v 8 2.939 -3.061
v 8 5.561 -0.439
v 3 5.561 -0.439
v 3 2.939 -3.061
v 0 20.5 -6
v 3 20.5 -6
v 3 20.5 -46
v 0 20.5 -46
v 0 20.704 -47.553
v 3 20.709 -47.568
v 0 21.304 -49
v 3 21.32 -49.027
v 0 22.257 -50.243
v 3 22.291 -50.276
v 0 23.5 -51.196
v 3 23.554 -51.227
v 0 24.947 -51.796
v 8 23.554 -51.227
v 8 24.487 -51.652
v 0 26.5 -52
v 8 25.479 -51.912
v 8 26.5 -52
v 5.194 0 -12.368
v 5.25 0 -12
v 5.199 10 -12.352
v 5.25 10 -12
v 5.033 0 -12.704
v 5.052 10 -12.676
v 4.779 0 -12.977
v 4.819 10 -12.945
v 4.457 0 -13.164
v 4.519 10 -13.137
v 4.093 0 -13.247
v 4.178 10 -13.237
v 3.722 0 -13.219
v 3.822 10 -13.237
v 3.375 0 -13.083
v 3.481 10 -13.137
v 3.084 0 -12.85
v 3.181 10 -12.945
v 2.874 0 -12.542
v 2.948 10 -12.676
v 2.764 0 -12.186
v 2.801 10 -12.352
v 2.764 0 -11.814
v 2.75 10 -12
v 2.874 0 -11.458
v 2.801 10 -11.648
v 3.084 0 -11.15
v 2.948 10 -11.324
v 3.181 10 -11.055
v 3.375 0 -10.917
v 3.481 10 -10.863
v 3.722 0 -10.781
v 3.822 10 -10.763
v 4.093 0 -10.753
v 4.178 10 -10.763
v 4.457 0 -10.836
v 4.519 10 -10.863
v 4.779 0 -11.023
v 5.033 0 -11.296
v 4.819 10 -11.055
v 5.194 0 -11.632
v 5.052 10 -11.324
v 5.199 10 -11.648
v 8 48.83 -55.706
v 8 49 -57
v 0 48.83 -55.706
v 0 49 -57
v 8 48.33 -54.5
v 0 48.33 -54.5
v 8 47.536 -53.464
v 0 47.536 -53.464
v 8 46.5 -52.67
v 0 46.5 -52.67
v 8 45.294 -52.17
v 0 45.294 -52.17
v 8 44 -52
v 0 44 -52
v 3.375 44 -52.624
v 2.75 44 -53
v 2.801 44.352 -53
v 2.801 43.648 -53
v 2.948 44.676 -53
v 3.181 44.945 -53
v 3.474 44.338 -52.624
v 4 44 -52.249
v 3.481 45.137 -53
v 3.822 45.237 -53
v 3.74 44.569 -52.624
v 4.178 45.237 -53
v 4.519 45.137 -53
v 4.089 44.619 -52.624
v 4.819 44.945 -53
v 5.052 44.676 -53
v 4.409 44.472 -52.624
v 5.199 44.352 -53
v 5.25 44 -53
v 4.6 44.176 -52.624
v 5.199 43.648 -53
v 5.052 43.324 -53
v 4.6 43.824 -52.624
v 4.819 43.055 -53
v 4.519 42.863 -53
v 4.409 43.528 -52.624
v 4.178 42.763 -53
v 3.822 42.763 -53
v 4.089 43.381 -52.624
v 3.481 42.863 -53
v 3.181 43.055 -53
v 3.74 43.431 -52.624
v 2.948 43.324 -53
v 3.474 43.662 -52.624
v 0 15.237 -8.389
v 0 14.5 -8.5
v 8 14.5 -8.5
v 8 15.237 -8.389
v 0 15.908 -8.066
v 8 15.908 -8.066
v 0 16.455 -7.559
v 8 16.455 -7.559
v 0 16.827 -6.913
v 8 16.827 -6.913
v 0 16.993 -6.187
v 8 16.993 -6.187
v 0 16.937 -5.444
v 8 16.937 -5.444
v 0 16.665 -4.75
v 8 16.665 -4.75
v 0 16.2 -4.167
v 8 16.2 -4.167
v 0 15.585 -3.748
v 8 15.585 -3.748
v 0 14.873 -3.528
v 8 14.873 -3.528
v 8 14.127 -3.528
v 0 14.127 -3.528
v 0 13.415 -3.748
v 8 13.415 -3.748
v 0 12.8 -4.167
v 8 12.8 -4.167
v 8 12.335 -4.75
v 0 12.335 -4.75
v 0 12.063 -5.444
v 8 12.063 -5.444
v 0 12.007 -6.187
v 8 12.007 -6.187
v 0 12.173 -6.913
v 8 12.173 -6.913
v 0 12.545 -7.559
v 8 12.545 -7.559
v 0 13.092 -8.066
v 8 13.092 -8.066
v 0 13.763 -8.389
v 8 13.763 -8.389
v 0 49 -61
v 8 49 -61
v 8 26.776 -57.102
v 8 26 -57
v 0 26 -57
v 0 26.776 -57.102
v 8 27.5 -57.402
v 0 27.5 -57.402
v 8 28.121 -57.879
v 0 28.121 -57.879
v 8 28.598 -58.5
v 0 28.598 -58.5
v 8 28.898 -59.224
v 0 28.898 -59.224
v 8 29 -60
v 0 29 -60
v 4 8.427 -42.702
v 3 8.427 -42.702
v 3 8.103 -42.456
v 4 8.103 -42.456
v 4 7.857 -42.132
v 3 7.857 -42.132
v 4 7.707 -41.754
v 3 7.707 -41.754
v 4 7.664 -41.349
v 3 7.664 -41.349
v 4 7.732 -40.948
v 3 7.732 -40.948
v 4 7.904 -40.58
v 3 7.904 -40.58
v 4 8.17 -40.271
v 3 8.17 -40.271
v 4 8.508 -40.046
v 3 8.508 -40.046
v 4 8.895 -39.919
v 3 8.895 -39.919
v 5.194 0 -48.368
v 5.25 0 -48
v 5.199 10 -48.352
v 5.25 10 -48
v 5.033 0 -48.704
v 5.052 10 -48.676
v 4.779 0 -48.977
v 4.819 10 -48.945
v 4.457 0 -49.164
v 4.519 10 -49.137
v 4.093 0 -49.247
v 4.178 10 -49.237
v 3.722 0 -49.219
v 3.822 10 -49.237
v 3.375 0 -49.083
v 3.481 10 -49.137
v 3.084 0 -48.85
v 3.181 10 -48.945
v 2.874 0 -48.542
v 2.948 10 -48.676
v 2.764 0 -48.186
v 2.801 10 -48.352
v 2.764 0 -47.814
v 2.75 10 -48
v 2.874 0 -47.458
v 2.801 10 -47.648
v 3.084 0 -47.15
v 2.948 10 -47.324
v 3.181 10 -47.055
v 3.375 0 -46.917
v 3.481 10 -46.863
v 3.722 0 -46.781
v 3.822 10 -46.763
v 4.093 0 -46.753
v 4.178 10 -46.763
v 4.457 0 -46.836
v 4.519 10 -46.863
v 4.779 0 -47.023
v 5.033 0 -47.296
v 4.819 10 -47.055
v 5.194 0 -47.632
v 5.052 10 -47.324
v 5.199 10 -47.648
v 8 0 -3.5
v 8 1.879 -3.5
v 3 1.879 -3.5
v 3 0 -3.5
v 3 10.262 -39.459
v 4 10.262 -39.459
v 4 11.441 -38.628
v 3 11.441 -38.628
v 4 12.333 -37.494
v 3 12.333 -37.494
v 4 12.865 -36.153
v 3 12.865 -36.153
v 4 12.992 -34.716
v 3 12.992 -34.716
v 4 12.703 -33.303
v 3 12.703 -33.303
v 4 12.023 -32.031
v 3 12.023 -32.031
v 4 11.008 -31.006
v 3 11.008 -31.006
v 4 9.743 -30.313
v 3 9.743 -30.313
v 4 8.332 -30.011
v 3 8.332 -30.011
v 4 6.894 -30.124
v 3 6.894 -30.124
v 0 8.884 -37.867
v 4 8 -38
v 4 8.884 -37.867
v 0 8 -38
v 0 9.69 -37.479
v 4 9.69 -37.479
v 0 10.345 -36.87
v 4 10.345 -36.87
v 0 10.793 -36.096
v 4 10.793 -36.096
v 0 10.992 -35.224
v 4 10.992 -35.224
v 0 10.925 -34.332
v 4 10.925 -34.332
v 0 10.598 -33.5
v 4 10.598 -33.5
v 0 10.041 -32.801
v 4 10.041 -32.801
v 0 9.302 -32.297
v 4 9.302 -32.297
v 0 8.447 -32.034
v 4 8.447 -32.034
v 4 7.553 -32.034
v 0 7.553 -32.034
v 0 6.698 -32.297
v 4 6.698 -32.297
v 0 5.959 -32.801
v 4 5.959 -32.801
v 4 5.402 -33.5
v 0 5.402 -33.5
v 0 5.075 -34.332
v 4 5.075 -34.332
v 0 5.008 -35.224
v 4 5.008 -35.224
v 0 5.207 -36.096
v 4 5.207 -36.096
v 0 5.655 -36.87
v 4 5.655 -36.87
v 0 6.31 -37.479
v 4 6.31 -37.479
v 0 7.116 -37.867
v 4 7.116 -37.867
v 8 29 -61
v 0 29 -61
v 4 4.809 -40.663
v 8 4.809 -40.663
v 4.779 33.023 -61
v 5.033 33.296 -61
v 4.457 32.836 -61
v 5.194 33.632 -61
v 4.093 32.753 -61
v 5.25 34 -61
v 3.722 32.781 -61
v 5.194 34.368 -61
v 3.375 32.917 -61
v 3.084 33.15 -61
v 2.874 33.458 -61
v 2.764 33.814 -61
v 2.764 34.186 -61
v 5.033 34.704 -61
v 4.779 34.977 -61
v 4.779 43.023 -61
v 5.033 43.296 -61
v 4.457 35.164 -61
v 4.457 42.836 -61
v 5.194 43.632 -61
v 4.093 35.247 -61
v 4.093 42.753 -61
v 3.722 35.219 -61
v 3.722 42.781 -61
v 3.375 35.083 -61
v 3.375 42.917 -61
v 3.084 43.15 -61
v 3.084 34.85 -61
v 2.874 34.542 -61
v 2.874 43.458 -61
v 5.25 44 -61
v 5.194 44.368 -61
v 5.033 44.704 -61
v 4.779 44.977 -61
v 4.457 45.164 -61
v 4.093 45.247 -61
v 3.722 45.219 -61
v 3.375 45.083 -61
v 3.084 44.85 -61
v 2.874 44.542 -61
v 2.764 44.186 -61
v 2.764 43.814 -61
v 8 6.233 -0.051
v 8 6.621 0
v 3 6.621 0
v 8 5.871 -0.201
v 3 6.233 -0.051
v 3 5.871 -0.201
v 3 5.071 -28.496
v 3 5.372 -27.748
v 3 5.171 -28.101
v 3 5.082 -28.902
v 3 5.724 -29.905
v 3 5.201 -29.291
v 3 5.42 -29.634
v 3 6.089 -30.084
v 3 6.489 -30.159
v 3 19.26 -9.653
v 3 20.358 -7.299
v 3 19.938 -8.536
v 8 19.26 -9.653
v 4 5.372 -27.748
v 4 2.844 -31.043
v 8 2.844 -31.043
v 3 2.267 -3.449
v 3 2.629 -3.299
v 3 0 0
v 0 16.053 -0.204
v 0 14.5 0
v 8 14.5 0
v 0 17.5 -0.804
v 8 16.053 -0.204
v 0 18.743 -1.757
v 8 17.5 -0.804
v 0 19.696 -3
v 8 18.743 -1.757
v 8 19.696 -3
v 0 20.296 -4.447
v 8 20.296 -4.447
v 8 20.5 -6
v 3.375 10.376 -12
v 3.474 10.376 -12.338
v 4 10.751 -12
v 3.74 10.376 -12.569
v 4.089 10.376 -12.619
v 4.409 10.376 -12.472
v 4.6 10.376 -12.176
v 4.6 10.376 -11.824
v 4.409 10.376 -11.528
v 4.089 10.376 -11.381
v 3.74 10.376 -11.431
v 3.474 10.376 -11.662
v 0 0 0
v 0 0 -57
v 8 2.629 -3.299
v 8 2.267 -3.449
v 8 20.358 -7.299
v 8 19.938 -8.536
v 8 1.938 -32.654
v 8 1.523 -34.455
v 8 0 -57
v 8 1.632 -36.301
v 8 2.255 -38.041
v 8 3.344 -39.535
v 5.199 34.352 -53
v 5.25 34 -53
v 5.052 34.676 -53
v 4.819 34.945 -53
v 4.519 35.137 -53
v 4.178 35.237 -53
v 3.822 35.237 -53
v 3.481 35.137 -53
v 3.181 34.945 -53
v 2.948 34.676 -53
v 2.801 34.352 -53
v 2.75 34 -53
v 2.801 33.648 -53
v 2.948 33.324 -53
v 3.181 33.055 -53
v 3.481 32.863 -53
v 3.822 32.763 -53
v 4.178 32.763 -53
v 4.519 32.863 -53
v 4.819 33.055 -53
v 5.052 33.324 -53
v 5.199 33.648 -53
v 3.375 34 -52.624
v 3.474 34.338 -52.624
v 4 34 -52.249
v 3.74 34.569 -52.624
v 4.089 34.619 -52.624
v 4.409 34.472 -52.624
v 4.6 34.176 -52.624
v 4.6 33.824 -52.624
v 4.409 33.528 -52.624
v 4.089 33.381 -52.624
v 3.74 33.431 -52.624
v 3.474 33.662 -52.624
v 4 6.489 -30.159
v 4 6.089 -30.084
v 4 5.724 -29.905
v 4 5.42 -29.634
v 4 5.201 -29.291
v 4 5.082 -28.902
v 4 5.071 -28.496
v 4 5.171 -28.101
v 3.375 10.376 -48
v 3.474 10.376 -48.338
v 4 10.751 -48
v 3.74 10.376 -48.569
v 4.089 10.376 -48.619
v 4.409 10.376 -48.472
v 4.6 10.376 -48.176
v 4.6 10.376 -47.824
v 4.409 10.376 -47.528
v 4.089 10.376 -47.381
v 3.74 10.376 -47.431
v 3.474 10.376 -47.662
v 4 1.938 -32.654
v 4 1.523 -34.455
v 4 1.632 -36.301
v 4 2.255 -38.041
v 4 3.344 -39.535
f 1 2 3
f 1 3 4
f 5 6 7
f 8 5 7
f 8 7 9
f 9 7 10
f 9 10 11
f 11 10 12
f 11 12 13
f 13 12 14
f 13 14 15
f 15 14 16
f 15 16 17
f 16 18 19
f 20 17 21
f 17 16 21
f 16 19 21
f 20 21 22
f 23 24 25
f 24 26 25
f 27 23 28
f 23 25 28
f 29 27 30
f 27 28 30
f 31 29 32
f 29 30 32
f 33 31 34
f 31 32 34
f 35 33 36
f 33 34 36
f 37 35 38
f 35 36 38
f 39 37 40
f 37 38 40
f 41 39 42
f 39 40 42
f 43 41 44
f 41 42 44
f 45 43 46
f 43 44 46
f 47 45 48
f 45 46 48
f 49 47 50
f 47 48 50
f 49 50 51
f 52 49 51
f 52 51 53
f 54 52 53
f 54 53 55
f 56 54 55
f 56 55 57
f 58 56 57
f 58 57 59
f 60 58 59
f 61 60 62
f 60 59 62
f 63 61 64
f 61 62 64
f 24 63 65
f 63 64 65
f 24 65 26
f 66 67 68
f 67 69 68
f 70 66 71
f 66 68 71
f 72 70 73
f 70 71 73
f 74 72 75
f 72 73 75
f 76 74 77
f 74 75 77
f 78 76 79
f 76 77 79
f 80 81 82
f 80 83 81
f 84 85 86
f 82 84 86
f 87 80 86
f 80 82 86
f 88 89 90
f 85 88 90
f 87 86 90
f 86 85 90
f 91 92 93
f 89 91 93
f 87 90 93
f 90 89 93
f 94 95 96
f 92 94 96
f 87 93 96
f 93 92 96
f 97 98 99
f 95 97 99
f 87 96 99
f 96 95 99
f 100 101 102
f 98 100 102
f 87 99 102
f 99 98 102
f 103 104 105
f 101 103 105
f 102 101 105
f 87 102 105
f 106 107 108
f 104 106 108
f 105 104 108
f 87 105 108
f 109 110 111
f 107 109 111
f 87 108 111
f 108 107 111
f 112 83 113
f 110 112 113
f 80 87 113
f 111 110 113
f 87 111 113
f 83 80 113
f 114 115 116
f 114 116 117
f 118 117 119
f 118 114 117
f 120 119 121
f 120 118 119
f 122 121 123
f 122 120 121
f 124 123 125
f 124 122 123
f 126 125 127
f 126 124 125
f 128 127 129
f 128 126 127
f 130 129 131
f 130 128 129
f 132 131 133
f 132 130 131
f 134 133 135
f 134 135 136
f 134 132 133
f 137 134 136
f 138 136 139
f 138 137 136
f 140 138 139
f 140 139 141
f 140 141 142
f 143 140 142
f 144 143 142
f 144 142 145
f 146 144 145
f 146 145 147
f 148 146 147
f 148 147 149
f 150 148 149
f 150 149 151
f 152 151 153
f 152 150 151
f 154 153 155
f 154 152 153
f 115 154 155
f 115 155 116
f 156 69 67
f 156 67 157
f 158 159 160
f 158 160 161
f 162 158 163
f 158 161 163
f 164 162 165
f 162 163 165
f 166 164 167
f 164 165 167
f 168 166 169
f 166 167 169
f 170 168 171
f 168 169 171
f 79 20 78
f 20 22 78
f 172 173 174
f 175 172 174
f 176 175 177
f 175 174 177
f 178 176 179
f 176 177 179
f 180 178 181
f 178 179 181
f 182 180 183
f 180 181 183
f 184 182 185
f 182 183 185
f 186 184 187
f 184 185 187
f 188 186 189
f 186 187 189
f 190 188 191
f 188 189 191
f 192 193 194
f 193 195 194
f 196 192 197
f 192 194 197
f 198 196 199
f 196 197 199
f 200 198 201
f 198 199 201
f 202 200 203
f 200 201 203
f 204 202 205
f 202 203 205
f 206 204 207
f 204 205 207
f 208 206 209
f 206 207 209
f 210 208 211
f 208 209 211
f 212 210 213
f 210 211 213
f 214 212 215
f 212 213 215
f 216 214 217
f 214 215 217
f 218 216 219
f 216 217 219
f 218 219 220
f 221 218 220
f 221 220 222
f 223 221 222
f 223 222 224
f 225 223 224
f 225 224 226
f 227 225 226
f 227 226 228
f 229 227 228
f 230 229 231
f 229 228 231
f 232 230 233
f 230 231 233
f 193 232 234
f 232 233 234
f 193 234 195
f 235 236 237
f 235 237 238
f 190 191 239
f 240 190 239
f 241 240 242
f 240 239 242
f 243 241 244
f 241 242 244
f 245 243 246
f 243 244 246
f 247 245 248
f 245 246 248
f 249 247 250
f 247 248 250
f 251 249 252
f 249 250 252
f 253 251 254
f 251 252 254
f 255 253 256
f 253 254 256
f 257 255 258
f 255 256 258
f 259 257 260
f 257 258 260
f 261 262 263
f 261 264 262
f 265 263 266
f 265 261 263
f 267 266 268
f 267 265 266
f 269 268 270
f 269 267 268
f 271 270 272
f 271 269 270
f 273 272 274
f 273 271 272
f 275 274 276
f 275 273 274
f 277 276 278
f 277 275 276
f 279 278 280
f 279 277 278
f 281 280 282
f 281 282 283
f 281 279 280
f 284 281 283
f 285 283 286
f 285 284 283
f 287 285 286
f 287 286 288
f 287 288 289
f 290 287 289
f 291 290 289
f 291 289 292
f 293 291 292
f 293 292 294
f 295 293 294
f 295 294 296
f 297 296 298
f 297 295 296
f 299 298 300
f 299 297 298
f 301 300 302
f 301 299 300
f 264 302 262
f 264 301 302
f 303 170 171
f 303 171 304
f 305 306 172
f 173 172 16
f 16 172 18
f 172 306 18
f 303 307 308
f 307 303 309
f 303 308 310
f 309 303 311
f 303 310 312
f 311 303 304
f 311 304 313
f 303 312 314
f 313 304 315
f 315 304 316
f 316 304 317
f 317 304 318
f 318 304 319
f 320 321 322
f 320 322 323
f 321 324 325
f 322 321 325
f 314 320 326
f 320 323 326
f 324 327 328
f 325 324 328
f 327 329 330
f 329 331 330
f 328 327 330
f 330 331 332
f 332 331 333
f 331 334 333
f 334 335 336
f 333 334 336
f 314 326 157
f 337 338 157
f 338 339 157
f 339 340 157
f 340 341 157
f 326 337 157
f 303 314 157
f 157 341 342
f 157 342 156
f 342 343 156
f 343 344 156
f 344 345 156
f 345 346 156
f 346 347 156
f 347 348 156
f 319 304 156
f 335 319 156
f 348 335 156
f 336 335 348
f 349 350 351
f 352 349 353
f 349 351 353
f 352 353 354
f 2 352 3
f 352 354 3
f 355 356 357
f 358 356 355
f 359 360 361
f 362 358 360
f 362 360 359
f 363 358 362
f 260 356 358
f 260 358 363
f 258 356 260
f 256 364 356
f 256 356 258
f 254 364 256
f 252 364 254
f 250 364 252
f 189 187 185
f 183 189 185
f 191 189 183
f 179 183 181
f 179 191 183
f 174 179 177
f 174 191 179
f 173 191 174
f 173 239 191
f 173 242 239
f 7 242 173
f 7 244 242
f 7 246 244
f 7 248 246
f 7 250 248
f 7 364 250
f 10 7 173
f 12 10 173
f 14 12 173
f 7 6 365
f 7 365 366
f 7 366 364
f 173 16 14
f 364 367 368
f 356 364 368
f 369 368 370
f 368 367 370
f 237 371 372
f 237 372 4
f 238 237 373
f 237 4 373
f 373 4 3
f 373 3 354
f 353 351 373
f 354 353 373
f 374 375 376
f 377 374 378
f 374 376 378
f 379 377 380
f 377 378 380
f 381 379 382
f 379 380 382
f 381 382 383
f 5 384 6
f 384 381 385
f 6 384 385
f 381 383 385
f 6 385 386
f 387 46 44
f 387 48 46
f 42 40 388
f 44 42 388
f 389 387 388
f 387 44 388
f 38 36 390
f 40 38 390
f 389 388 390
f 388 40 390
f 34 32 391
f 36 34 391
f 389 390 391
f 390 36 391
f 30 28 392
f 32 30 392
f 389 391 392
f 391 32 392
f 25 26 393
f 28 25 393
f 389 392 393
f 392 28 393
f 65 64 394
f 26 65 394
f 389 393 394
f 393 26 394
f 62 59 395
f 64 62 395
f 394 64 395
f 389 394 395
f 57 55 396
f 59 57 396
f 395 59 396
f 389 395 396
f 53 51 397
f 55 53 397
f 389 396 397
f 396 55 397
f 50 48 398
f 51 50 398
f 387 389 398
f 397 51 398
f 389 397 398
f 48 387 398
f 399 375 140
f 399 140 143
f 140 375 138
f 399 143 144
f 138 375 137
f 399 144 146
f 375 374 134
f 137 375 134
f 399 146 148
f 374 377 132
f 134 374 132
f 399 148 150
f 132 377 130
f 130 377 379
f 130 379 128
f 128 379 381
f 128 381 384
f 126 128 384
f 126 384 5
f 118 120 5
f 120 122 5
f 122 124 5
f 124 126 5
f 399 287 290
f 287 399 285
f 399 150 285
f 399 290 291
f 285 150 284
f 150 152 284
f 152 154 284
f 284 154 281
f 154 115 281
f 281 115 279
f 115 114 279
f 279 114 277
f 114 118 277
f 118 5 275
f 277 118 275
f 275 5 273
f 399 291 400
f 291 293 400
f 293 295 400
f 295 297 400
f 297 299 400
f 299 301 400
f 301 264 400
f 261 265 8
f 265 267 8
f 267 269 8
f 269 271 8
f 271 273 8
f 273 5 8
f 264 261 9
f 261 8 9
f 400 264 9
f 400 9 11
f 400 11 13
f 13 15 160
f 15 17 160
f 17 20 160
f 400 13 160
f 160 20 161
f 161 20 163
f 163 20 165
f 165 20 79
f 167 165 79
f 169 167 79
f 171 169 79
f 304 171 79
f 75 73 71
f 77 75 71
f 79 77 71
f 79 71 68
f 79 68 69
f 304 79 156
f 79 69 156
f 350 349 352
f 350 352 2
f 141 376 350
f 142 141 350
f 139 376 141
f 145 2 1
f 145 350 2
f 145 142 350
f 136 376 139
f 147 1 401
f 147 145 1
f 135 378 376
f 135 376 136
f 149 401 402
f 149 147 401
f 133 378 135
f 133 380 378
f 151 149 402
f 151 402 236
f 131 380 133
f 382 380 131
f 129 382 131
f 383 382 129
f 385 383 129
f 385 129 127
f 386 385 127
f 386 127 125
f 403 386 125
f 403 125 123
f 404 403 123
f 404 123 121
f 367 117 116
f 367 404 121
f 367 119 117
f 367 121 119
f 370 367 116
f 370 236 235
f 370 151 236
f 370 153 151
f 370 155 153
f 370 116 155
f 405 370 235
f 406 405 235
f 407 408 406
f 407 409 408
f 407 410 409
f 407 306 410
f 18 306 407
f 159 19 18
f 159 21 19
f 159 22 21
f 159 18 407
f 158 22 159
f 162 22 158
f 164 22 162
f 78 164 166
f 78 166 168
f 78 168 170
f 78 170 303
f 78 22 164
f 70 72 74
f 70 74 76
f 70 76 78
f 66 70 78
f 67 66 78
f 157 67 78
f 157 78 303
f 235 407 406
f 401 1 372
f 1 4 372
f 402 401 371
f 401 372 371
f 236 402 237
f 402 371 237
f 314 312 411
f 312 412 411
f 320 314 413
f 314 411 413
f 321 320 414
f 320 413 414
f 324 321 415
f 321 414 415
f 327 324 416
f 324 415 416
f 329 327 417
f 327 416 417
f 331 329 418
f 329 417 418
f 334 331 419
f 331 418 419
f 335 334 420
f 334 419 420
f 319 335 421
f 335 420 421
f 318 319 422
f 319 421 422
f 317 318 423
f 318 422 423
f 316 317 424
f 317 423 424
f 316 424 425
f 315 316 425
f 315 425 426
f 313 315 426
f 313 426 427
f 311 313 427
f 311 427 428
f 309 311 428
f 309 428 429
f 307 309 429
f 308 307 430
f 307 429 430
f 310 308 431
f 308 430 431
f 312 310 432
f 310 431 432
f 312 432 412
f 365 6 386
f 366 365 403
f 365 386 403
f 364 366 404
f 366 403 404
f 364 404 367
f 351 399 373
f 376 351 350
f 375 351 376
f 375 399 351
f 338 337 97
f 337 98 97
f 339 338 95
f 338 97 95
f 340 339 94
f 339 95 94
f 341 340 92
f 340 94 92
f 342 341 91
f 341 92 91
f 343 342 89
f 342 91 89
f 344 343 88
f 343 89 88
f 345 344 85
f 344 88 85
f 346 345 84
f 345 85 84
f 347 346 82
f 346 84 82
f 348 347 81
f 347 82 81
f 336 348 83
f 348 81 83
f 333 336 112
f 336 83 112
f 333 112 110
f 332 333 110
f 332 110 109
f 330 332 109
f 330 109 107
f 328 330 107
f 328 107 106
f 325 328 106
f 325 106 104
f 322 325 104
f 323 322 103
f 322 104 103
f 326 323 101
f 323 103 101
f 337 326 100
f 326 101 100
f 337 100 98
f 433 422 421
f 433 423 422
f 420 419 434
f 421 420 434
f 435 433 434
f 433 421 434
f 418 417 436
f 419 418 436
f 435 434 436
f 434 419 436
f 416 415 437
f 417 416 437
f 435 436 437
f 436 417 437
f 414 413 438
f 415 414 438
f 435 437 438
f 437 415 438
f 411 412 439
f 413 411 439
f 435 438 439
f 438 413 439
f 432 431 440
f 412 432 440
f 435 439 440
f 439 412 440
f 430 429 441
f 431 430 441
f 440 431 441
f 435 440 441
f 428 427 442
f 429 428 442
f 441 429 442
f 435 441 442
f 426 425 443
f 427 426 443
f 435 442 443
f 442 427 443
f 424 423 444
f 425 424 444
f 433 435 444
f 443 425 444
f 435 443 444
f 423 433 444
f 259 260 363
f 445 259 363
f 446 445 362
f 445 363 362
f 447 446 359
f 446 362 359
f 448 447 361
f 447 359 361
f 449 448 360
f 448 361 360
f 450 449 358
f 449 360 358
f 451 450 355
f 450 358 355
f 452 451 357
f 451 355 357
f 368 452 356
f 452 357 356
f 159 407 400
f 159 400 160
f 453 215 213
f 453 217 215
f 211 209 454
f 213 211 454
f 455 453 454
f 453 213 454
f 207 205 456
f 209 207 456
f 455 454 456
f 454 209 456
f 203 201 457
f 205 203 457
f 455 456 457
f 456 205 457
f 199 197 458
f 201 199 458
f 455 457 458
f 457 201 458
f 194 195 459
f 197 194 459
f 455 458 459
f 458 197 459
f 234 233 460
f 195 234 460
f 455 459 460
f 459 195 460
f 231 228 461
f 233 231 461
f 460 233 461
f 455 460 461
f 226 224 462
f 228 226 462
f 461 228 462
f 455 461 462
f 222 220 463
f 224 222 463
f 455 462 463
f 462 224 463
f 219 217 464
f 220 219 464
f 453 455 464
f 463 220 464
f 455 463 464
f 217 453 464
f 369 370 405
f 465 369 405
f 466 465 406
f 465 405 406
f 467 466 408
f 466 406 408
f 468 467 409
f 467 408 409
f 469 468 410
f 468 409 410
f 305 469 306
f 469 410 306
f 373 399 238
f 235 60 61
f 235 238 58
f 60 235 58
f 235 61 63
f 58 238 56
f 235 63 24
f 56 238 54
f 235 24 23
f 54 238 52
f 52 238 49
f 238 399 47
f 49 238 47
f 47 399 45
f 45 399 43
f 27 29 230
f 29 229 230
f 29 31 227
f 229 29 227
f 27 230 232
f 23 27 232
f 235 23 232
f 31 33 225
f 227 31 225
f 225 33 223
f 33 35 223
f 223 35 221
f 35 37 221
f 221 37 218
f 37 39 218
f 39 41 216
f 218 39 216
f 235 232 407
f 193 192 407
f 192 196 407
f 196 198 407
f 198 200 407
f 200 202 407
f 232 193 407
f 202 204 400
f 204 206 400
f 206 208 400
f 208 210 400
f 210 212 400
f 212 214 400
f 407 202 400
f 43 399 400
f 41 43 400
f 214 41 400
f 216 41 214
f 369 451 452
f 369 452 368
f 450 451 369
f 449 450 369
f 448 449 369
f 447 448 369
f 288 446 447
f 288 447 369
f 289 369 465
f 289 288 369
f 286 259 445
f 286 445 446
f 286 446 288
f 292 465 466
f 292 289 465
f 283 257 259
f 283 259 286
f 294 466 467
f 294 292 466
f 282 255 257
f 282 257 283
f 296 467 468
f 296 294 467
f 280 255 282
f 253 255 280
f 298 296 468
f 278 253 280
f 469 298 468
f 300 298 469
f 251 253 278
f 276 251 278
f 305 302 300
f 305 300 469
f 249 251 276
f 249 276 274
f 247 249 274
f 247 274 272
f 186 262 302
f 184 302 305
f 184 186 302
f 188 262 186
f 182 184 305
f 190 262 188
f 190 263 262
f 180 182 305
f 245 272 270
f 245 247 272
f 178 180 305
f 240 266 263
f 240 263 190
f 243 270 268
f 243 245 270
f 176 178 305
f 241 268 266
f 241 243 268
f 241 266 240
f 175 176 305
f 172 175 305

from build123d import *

# Parameters (mm, degrees)
SKETCH1_W                   = 61
SKETCH1_H                   = 49
SKETCH1_R                   = 2.5
SKETCH1_R_2                 = 3
BOSS_EXTRUDE1_DEPTH         = 8
CUT_EXTRUDE2_REACH          = 80.651
SKETCH3_W                   = 4
SKETCH3_H                   = 29
FILLET2_R                   = 3
TAP_DRILL_FOR_M3_TAP1_D     = 2.5
TAP_DRILL_FOR_M3_TAP1_DEPTH = 10
TAP_DRILL_FOR_M3_TAP1_TIP   = 0.751075774
TAP_DRILL_FOR_M3_TAP2_D     = 2.5
TAP_DRILL_FOR_M3_TAP2_DEPTH = 8
TAP_DRILL_FOR_M3_TAP2_TIP   = 0.751075774
CUT_EXTRUDE3_DEPTH          = 8
CUT_EXTRUDE4_DEPTH          = 5
SKETCH14_R                  = 3
BOSS_EXTRUDE2_DEPTH         = 1
FILLET3_R                   = 5
FILLET4_R                   = 1.5


with BuildPart() as part:
    # Sketch1 → Boss-Extrude1 (new body)
    with BuildSketch(Plane(origin=(0, 0, 0), x_dir=(0, 0, -1), z_dir=(1, 0, 0))):
        with Locations((30.5, 24.5)):
            Rectangle(SKETCH1_W, SKETCH1_H)
        with Locations((6, 14.5)):
            Circle(SKETCH1_R, mode=Mode.SUBTRACT)
        with Locations((35, 8)):
            Circle(SKETCH1_R_2, mode=Mode.SUBTRACT)
    extrude(amount=BOSS_EXTRUDE1_DEPTH)

    # Sketch3 → Cut-Extrude2 (cut, up to next)
    with BuildSketch(Plane(origin=(8, 0, 0), x_dir=(0, 0, -1), z_dir=(1, 0, 0)), mode=Mode.PRIVATE) as cut_extrude2_sk1:
        with Locations((59, 14.5)):
            Rectangle(SKETCH3_W, SKETCH3_H)
    cut_extrude2_tool1 = extrude(cut_extrude2_sk1.sketch, amount=-CUT_EXTRUDE2_REACH, mode=Mode.PRIVATE) & part.part
    add(cut_extrude2_tool1.solids().sort_by_distance((8, 14.5, -59))[0], mode=Mode.SUBTRACT)

    # Fillet2
    fillet2_edges = [part.edges().sort_by_distance(p)[0] for p in [
        (4, 29, -57),
    ]]
    fillet(fillet2_edges, radius=FILLET2_R)

    # Tap Drill for M3 Tap1
    with Locations(Plane(origin=(0, 0, 0), x_dir=(-1, 0, 0), z_dir=(0, -1, 0))):
        with Locations((-4, 48), (-4, 12)):
            Hole(TAP_DRILL_FOR_M3_TAP1_D / 2, depth=TAP_DRILL_FOR_M3_TAP1_DEPTH)
            with Locations((0, 0, -(TAP_DRILL_FOR_M3_TAP1_DEPTH + TAP_DRILL_FOR_M3_TAP1_TIP / 2))):  # 118° drill point
                Cone(0, TAP_DRILL_FOR_M3_TAP1_D / 2, TAP_DRILL_FOR_M3_TAP1_TIP, mode=Mode.SUBTRACT)

    # Tap Drill for M3 Tap2
    with Locations(Plane(origin=(0, 0, -61), x_dir=(-1, 0, 0), z_dir=(0, 0, -1))):
        with Locations((-4, 44), (-4, 34)):
            Hole(TAP_DRILL_FOR_M3_TAP2_D / 2, depth=TAP_DRILL_FOR_M3_TAP2_DEPTH)
            with Locations((0, 0, -(TAP_DRILL_FOR_M3_TAP2_DEPTH + TAP_DRILL_FOR_M3_TAP2_TIP / 2))):  # 118° drill point
                Cone(0, TAP_DRILL_FOR_M3_TAP2_D / 2, TAP_DRILL_FOR_M3_TAP2_TIP, mode=Mode.SUBTRACT)

    # Sketch9 → Cut-Extrude3 (cut)
    with BuildSketch(Plane(origin=(8, 0, 0), x_dir=(0, 0, -1), z_dir=(1, 0, 0))):
        with BuildLine():
            Line((6, 20.5), (46, 20.5))
            ThreePointArc((46, 20.5), (50.242640687, 22.257359313), (52, 26.5))
            Line((52, 26.5), (52, 49))
            Line((52, 49), (0, 49))
            Line((0, 49), (0, 14.5))
            ThreePointArc((0, 14.5), (1.757359313, 18.742640687), (6, 20.5))
        make_face()
    extrude(amount=-CUT_EXTRUDE3_DEPTH, mode=Mode.SUBTRACT)

    # Sketch13 → Cut-Extrude4 (cut)
    with BuildSketch(Plane(origin=(8, 0, 0), x_dir=(0, 0, -1), z_dir=(1, 0, 0))):
        with BuildLine():
            Line((9.653047907, 19.259752199), (31.042531435, 2.843601785))
            ThreePointArc((31.042531435, 2.843601785), (36.300887291, 1.631507851), (40.662647671, 4.808695979))
            Line((40.662647671, 4.808695979), (51.227059389, 23.554180904))
            ThreePointArc((51.227059389, 23.554180904), (51.803548756, 24.97723218), (52, 26.5))
            Line((52, 26.5), (0, 26.5))
            Line((0, 26.5), (0, 14.5))
            ThreePointArc((0, 14.5), (3.346538811, 19.88137006), (9.653047907, 19.259752199))
        make_face()
        Polygon((0, 6), (3.5, 2.5), (3.5, 0), (0, 0), align=None)
    extrude(amount=-CUT_EXTRUDE4_DEPTH, mode=Mode.SUBTRACT)

    # Sketch14 → Boss-Extrude2 (add)
    with BuildSketch(Plane(origin=(3, 0, 0), x_dir=(0, 0, -1), z_dir=(1, 0, 0))):
        with BuildLine():
            Line((27.747742168, 5.372309694), (31.042531435, 2.843601785))
            ThreePointArc((31.042531435, 2.843601785), (36.300887291, 1.631507851), (40.662647671, 4.808695979))
            Line((40.662647671, 4.808695979), (42.701798604, 8.426964))
            ThreePointArc((42.701798604, 8.426964), (41.146254574, 7.684192991), (39.919256736, 8.894937519))
            ThreePointArc((39.919256736, 8.894937519), (33.999317468, 12.898840115), (30.123849342, 6.894036726))
            ThreePointArc((30.123849342, 6.894036726), (29.469968742, 5.299086519), (27.747742168, 5.372309694))
        make_face()
        with Locations((35, 8)):
            Circle(SKETCH14_R, mode=Mode.SUBTRACT)
    extrude(amount=BOSS_EXTRUDE2_DEPTH)

    # Fillet3
    fillet3_edges = [part.edges().sort_by_distance(p)[0] for p in [
        (4, 49, -52),
    ]]
    fillet(fillet3_edges, radius=FILLET3_R)

    # Fillet4
    fillet4_edges = [part.edges().sort_by_distance(p)[0] for p in [
        (5.5, 6, 0),
        (5.5, 2.5, -3.5),
    ]]
    fillet(fillet4_edges, radius=FILLET4_R)


solid = part.part
